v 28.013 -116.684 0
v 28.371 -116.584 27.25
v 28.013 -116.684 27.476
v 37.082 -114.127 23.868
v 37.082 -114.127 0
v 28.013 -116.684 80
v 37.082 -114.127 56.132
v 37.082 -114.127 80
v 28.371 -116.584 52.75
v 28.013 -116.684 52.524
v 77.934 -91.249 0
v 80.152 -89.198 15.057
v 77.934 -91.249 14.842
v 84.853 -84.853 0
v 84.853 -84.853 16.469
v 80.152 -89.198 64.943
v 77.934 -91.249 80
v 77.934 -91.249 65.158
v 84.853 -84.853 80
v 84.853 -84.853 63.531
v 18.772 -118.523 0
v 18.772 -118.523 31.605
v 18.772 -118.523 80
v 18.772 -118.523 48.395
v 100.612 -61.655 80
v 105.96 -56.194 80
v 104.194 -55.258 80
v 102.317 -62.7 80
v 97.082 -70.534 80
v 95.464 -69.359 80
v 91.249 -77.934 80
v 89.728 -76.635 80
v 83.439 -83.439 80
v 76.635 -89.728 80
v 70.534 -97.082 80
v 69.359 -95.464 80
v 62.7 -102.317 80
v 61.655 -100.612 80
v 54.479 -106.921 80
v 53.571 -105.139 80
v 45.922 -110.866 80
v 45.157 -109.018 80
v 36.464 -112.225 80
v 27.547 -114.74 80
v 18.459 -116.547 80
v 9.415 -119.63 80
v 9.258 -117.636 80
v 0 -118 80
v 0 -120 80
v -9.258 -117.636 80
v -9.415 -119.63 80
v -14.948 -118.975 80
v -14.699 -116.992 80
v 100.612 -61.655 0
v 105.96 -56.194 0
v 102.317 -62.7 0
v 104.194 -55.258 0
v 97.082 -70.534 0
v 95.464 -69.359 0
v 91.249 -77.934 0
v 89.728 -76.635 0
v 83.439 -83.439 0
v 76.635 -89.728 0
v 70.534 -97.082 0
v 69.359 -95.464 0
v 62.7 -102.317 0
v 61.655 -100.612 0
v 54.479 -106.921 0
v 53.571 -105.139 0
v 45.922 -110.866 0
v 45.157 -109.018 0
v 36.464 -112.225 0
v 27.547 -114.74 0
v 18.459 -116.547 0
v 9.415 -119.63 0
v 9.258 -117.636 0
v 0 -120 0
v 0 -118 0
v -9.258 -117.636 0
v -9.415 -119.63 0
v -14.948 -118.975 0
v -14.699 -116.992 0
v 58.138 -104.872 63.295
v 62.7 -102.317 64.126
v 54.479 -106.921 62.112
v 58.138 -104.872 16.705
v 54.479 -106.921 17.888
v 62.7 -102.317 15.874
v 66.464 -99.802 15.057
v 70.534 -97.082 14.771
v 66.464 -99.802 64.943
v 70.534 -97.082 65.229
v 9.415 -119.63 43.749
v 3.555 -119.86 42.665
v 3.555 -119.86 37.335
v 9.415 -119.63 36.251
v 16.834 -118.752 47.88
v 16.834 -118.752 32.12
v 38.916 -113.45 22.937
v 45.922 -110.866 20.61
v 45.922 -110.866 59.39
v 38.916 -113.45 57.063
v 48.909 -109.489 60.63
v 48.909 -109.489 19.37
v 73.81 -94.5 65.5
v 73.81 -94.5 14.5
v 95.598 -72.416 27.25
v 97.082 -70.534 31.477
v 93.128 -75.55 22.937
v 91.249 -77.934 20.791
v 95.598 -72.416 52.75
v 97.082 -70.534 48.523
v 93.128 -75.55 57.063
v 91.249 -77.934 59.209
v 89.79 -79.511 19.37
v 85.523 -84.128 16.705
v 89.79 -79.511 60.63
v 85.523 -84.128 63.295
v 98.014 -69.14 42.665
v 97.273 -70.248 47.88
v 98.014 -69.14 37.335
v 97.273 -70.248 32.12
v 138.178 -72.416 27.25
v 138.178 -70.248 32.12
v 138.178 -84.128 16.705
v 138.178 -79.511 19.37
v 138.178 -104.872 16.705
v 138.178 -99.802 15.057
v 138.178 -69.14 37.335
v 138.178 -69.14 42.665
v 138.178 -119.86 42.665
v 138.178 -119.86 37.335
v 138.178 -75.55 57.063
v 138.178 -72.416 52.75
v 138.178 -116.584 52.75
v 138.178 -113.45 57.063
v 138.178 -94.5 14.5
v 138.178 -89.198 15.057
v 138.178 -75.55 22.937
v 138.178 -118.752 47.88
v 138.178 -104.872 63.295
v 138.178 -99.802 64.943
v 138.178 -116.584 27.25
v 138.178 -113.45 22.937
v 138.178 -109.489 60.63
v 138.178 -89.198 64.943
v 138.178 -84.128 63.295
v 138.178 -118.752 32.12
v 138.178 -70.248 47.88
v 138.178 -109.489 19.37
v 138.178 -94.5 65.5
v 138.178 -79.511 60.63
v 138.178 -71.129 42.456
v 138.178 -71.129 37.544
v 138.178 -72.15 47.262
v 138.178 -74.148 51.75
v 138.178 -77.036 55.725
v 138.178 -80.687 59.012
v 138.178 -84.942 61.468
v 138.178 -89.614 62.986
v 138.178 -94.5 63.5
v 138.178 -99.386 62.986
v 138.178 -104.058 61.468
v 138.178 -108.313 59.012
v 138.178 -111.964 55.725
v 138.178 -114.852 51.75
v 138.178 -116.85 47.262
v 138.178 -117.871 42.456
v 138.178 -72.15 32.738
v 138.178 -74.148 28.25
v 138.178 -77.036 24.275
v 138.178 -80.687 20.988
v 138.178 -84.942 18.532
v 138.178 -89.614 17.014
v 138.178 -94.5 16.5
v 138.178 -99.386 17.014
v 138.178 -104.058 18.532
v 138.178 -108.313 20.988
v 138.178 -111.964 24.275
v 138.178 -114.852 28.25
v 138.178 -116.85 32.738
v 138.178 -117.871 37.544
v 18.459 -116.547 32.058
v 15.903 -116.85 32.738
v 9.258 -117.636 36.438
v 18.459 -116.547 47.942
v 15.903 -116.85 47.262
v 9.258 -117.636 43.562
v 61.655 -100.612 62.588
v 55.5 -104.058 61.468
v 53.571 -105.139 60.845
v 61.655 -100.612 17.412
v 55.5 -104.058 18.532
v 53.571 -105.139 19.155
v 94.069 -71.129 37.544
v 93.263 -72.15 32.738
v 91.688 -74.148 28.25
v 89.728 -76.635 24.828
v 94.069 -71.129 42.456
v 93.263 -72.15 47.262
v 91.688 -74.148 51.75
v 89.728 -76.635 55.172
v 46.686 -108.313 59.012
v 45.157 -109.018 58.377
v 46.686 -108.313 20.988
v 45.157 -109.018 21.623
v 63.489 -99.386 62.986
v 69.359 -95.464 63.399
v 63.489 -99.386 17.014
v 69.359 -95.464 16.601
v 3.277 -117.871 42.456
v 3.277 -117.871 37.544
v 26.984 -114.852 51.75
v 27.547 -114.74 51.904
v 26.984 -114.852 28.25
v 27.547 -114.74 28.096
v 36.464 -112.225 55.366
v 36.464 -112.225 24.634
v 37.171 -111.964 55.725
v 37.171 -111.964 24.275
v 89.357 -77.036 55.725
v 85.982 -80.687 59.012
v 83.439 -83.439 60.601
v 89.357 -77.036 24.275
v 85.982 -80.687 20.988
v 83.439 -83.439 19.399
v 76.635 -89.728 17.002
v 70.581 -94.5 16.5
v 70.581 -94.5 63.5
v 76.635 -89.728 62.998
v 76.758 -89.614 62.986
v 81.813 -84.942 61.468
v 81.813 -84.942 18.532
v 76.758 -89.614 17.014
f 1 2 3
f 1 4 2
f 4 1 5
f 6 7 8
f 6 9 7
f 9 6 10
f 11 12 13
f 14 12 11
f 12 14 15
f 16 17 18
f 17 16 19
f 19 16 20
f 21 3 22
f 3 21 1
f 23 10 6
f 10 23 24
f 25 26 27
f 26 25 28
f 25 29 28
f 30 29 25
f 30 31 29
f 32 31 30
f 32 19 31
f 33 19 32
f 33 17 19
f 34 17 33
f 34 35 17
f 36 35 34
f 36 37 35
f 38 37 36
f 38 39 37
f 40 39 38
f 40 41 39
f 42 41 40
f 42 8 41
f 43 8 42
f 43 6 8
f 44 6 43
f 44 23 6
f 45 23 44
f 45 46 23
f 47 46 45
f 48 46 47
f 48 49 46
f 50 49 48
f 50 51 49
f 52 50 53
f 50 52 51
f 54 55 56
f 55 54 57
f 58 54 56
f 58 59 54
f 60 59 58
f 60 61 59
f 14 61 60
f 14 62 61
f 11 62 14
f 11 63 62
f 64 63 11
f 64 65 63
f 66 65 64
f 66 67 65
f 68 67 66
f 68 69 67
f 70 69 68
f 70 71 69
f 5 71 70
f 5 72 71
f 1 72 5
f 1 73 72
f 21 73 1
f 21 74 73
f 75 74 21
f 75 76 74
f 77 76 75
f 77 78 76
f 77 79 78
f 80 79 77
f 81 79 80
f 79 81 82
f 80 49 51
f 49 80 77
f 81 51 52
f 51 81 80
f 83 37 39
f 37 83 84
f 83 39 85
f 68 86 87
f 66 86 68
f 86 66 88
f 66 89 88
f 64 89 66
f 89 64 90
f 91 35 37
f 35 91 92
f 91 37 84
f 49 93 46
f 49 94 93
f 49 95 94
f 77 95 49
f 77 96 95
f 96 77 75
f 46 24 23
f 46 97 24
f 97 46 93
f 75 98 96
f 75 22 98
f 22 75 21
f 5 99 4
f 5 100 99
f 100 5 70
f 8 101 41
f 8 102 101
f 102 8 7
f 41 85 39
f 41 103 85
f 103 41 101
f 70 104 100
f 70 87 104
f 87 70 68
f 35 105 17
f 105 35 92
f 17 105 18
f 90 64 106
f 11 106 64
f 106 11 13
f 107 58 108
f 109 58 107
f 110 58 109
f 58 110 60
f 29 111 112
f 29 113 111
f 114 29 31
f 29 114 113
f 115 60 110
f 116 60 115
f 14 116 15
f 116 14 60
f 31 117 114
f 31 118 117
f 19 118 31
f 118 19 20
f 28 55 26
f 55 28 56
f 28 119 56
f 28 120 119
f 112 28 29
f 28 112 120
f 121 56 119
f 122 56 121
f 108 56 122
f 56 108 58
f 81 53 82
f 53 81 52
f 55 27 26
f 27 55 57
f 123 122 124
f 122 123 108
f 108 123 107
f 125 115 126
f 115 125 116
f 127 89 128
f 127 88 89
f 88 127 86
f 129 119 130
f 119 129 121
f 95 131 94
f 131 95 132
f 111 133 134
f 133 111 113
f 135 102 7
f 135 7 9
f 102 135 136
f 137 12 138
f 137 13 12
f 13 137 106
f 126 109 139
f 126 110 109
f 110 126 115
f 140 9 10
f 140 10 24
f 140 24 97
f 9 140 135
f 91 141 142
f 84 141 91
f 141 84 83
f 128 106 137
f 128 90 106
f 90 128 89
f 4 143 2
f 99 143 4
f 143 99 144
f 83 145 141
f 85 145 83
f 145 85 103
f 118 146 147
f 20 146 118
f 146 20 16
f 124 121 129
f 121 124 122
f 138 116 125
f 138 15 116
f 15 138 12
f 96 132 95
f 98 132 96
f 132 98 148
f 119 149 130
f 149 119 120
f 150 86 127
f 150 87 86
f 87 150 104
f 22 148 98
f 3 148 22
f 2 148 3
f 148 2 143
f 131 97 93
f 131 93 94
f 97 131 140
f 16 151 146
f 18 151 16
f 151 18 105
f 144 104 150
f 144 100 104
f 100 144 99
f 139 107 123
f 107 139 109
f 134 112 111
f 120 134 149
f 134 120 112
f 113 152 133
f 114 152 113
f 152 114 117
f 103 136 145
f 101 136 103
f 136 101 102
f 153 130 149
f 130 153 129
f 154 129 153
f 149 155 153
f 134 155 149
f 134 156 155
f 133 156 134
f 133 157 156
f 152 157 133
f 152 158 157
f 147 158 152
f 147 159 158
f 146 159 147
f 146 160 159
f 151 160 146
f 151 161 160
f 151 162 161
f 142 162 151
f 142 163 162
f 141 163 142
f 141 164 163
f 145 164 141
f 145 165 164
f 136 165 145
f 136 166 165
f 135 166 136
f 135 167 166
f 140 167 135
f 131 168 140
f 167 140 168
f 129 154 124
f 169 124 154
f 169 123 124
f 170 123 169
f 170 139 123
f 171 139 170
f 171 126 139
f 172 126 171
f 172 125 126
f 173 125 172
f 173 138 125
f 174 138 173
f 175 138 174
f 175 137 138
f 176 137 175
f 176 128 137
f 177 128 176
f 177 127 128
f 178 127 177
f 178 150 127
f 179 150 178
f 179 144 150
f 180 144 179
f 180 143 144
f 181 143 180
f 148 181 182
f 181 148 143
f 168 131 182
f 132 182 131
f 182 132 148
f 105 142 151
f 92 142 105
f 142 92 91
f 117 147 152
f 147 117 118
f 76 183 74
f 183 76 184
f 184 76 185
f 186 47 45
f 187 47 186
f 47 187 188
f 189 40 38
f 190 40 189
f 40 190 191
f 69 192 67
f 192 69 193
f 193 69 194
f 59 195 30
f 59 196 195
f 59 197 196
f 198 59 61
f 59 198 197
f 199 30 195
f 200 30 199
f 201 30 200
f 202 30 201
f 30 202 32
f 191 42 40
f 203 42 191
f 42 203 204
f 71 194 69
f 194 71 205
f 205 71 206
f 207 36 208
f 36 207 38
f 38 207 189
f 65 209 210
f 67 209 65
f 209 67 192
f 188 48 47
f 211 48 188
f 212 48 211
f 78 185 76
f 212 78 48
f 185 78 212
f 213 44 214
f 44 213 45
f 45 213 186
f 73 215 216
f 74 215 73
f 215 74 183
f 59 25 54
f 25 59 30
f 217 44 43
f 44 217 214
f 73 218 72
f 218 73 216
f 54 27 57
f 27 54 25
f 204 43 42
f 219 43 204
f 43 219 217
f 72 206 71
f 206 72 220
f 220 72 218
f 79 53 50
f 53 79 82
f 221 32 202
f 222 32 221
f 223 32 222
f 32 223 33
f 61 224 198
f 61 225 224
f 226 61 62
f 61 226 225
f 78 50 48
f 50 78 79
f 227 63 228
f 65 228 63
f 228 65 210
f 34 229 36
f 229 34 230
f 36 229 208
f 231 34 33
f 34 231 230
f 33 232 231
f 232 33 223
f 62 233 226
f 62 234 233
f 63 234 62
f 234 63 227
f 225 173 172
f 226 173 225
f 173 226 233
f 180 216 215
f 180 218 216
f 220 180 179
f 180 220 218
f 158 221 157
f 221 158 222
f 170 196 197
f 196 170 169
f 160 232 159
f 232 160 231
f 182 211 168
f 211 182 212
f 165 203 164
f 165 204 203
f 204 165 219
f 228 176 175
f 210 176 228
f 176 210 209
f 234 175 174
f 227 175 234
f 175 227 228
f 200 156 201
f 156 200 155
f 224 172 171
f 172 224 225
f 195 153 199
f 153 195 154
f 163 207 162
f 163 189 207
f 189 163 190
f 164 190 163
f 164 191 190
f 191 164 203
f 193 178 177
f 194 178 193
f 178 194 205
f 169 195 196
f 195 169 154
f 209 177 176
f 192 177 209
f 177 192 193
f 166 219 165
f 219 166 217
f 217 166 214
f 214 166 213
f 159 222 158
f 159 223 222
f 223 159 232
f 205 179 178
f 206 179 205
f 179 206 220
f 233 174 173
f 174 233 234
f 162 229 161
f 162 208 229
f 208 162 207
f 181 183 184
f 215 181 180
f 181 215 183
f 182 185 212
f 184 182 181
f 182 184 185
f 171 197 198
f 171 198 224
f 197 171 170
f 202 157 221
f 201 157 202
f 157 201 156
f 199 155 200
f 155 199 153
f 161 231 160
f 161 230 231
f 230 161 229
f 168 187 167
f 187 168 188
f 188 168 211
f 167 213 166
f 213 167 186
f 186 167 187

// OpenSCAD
d = 2;      // thickness material

dB = 300-2*30;   // outer diameter inner ring in bucket (diameter for polycarbonate)
// dMOut: outer diameter tube from mill
// i.e. you put the tube coming from the mill into this tube
dMOut = 47;
h = 80;     // height plexy
extraSpace = 15;    // extra space on segment left & right of tube entry

echo(diameter_inner_ring=dB);
echo(outside_diameter_tube=dMOut);
echo(height_plexy=h);

dM = dMOut +2*d;

alpha = acos((dB/2-dM)/(dB/2));
PI = 3.142;
extraAngle = extraSpace / (PI*dB) * 360;

module segment(offset=0) {
    // rotate_extrude ignores angle parameter!
    // rotate_extrude(angle=alpha)square([dB/2,h]);
    difference() {
        cylinder(d=dB-2*offset, h=h, $fn=80);
        rotate([0,0,-extraAngle])translate([-dB/2,-dB/2,0])cube([dB/2,dB,h]);
        rotate([0,0,180+alpha+extraAngle])translate([-dB/2,-dB/2,0])cube([dB/2,dB,h]);
    }
}

module millTube(offset=0) {
    lTube = dB/2*sin(alpha) + 40;
    translate([0,-dB/2+dM/2, h/2])
    rotate([0,90,0])cylinder(d=dM-2*offset, h=lTube);
}

difference() {
    union() {
        segment();
        millTube();
    }
    segment(d);
    millTube(d);
}
